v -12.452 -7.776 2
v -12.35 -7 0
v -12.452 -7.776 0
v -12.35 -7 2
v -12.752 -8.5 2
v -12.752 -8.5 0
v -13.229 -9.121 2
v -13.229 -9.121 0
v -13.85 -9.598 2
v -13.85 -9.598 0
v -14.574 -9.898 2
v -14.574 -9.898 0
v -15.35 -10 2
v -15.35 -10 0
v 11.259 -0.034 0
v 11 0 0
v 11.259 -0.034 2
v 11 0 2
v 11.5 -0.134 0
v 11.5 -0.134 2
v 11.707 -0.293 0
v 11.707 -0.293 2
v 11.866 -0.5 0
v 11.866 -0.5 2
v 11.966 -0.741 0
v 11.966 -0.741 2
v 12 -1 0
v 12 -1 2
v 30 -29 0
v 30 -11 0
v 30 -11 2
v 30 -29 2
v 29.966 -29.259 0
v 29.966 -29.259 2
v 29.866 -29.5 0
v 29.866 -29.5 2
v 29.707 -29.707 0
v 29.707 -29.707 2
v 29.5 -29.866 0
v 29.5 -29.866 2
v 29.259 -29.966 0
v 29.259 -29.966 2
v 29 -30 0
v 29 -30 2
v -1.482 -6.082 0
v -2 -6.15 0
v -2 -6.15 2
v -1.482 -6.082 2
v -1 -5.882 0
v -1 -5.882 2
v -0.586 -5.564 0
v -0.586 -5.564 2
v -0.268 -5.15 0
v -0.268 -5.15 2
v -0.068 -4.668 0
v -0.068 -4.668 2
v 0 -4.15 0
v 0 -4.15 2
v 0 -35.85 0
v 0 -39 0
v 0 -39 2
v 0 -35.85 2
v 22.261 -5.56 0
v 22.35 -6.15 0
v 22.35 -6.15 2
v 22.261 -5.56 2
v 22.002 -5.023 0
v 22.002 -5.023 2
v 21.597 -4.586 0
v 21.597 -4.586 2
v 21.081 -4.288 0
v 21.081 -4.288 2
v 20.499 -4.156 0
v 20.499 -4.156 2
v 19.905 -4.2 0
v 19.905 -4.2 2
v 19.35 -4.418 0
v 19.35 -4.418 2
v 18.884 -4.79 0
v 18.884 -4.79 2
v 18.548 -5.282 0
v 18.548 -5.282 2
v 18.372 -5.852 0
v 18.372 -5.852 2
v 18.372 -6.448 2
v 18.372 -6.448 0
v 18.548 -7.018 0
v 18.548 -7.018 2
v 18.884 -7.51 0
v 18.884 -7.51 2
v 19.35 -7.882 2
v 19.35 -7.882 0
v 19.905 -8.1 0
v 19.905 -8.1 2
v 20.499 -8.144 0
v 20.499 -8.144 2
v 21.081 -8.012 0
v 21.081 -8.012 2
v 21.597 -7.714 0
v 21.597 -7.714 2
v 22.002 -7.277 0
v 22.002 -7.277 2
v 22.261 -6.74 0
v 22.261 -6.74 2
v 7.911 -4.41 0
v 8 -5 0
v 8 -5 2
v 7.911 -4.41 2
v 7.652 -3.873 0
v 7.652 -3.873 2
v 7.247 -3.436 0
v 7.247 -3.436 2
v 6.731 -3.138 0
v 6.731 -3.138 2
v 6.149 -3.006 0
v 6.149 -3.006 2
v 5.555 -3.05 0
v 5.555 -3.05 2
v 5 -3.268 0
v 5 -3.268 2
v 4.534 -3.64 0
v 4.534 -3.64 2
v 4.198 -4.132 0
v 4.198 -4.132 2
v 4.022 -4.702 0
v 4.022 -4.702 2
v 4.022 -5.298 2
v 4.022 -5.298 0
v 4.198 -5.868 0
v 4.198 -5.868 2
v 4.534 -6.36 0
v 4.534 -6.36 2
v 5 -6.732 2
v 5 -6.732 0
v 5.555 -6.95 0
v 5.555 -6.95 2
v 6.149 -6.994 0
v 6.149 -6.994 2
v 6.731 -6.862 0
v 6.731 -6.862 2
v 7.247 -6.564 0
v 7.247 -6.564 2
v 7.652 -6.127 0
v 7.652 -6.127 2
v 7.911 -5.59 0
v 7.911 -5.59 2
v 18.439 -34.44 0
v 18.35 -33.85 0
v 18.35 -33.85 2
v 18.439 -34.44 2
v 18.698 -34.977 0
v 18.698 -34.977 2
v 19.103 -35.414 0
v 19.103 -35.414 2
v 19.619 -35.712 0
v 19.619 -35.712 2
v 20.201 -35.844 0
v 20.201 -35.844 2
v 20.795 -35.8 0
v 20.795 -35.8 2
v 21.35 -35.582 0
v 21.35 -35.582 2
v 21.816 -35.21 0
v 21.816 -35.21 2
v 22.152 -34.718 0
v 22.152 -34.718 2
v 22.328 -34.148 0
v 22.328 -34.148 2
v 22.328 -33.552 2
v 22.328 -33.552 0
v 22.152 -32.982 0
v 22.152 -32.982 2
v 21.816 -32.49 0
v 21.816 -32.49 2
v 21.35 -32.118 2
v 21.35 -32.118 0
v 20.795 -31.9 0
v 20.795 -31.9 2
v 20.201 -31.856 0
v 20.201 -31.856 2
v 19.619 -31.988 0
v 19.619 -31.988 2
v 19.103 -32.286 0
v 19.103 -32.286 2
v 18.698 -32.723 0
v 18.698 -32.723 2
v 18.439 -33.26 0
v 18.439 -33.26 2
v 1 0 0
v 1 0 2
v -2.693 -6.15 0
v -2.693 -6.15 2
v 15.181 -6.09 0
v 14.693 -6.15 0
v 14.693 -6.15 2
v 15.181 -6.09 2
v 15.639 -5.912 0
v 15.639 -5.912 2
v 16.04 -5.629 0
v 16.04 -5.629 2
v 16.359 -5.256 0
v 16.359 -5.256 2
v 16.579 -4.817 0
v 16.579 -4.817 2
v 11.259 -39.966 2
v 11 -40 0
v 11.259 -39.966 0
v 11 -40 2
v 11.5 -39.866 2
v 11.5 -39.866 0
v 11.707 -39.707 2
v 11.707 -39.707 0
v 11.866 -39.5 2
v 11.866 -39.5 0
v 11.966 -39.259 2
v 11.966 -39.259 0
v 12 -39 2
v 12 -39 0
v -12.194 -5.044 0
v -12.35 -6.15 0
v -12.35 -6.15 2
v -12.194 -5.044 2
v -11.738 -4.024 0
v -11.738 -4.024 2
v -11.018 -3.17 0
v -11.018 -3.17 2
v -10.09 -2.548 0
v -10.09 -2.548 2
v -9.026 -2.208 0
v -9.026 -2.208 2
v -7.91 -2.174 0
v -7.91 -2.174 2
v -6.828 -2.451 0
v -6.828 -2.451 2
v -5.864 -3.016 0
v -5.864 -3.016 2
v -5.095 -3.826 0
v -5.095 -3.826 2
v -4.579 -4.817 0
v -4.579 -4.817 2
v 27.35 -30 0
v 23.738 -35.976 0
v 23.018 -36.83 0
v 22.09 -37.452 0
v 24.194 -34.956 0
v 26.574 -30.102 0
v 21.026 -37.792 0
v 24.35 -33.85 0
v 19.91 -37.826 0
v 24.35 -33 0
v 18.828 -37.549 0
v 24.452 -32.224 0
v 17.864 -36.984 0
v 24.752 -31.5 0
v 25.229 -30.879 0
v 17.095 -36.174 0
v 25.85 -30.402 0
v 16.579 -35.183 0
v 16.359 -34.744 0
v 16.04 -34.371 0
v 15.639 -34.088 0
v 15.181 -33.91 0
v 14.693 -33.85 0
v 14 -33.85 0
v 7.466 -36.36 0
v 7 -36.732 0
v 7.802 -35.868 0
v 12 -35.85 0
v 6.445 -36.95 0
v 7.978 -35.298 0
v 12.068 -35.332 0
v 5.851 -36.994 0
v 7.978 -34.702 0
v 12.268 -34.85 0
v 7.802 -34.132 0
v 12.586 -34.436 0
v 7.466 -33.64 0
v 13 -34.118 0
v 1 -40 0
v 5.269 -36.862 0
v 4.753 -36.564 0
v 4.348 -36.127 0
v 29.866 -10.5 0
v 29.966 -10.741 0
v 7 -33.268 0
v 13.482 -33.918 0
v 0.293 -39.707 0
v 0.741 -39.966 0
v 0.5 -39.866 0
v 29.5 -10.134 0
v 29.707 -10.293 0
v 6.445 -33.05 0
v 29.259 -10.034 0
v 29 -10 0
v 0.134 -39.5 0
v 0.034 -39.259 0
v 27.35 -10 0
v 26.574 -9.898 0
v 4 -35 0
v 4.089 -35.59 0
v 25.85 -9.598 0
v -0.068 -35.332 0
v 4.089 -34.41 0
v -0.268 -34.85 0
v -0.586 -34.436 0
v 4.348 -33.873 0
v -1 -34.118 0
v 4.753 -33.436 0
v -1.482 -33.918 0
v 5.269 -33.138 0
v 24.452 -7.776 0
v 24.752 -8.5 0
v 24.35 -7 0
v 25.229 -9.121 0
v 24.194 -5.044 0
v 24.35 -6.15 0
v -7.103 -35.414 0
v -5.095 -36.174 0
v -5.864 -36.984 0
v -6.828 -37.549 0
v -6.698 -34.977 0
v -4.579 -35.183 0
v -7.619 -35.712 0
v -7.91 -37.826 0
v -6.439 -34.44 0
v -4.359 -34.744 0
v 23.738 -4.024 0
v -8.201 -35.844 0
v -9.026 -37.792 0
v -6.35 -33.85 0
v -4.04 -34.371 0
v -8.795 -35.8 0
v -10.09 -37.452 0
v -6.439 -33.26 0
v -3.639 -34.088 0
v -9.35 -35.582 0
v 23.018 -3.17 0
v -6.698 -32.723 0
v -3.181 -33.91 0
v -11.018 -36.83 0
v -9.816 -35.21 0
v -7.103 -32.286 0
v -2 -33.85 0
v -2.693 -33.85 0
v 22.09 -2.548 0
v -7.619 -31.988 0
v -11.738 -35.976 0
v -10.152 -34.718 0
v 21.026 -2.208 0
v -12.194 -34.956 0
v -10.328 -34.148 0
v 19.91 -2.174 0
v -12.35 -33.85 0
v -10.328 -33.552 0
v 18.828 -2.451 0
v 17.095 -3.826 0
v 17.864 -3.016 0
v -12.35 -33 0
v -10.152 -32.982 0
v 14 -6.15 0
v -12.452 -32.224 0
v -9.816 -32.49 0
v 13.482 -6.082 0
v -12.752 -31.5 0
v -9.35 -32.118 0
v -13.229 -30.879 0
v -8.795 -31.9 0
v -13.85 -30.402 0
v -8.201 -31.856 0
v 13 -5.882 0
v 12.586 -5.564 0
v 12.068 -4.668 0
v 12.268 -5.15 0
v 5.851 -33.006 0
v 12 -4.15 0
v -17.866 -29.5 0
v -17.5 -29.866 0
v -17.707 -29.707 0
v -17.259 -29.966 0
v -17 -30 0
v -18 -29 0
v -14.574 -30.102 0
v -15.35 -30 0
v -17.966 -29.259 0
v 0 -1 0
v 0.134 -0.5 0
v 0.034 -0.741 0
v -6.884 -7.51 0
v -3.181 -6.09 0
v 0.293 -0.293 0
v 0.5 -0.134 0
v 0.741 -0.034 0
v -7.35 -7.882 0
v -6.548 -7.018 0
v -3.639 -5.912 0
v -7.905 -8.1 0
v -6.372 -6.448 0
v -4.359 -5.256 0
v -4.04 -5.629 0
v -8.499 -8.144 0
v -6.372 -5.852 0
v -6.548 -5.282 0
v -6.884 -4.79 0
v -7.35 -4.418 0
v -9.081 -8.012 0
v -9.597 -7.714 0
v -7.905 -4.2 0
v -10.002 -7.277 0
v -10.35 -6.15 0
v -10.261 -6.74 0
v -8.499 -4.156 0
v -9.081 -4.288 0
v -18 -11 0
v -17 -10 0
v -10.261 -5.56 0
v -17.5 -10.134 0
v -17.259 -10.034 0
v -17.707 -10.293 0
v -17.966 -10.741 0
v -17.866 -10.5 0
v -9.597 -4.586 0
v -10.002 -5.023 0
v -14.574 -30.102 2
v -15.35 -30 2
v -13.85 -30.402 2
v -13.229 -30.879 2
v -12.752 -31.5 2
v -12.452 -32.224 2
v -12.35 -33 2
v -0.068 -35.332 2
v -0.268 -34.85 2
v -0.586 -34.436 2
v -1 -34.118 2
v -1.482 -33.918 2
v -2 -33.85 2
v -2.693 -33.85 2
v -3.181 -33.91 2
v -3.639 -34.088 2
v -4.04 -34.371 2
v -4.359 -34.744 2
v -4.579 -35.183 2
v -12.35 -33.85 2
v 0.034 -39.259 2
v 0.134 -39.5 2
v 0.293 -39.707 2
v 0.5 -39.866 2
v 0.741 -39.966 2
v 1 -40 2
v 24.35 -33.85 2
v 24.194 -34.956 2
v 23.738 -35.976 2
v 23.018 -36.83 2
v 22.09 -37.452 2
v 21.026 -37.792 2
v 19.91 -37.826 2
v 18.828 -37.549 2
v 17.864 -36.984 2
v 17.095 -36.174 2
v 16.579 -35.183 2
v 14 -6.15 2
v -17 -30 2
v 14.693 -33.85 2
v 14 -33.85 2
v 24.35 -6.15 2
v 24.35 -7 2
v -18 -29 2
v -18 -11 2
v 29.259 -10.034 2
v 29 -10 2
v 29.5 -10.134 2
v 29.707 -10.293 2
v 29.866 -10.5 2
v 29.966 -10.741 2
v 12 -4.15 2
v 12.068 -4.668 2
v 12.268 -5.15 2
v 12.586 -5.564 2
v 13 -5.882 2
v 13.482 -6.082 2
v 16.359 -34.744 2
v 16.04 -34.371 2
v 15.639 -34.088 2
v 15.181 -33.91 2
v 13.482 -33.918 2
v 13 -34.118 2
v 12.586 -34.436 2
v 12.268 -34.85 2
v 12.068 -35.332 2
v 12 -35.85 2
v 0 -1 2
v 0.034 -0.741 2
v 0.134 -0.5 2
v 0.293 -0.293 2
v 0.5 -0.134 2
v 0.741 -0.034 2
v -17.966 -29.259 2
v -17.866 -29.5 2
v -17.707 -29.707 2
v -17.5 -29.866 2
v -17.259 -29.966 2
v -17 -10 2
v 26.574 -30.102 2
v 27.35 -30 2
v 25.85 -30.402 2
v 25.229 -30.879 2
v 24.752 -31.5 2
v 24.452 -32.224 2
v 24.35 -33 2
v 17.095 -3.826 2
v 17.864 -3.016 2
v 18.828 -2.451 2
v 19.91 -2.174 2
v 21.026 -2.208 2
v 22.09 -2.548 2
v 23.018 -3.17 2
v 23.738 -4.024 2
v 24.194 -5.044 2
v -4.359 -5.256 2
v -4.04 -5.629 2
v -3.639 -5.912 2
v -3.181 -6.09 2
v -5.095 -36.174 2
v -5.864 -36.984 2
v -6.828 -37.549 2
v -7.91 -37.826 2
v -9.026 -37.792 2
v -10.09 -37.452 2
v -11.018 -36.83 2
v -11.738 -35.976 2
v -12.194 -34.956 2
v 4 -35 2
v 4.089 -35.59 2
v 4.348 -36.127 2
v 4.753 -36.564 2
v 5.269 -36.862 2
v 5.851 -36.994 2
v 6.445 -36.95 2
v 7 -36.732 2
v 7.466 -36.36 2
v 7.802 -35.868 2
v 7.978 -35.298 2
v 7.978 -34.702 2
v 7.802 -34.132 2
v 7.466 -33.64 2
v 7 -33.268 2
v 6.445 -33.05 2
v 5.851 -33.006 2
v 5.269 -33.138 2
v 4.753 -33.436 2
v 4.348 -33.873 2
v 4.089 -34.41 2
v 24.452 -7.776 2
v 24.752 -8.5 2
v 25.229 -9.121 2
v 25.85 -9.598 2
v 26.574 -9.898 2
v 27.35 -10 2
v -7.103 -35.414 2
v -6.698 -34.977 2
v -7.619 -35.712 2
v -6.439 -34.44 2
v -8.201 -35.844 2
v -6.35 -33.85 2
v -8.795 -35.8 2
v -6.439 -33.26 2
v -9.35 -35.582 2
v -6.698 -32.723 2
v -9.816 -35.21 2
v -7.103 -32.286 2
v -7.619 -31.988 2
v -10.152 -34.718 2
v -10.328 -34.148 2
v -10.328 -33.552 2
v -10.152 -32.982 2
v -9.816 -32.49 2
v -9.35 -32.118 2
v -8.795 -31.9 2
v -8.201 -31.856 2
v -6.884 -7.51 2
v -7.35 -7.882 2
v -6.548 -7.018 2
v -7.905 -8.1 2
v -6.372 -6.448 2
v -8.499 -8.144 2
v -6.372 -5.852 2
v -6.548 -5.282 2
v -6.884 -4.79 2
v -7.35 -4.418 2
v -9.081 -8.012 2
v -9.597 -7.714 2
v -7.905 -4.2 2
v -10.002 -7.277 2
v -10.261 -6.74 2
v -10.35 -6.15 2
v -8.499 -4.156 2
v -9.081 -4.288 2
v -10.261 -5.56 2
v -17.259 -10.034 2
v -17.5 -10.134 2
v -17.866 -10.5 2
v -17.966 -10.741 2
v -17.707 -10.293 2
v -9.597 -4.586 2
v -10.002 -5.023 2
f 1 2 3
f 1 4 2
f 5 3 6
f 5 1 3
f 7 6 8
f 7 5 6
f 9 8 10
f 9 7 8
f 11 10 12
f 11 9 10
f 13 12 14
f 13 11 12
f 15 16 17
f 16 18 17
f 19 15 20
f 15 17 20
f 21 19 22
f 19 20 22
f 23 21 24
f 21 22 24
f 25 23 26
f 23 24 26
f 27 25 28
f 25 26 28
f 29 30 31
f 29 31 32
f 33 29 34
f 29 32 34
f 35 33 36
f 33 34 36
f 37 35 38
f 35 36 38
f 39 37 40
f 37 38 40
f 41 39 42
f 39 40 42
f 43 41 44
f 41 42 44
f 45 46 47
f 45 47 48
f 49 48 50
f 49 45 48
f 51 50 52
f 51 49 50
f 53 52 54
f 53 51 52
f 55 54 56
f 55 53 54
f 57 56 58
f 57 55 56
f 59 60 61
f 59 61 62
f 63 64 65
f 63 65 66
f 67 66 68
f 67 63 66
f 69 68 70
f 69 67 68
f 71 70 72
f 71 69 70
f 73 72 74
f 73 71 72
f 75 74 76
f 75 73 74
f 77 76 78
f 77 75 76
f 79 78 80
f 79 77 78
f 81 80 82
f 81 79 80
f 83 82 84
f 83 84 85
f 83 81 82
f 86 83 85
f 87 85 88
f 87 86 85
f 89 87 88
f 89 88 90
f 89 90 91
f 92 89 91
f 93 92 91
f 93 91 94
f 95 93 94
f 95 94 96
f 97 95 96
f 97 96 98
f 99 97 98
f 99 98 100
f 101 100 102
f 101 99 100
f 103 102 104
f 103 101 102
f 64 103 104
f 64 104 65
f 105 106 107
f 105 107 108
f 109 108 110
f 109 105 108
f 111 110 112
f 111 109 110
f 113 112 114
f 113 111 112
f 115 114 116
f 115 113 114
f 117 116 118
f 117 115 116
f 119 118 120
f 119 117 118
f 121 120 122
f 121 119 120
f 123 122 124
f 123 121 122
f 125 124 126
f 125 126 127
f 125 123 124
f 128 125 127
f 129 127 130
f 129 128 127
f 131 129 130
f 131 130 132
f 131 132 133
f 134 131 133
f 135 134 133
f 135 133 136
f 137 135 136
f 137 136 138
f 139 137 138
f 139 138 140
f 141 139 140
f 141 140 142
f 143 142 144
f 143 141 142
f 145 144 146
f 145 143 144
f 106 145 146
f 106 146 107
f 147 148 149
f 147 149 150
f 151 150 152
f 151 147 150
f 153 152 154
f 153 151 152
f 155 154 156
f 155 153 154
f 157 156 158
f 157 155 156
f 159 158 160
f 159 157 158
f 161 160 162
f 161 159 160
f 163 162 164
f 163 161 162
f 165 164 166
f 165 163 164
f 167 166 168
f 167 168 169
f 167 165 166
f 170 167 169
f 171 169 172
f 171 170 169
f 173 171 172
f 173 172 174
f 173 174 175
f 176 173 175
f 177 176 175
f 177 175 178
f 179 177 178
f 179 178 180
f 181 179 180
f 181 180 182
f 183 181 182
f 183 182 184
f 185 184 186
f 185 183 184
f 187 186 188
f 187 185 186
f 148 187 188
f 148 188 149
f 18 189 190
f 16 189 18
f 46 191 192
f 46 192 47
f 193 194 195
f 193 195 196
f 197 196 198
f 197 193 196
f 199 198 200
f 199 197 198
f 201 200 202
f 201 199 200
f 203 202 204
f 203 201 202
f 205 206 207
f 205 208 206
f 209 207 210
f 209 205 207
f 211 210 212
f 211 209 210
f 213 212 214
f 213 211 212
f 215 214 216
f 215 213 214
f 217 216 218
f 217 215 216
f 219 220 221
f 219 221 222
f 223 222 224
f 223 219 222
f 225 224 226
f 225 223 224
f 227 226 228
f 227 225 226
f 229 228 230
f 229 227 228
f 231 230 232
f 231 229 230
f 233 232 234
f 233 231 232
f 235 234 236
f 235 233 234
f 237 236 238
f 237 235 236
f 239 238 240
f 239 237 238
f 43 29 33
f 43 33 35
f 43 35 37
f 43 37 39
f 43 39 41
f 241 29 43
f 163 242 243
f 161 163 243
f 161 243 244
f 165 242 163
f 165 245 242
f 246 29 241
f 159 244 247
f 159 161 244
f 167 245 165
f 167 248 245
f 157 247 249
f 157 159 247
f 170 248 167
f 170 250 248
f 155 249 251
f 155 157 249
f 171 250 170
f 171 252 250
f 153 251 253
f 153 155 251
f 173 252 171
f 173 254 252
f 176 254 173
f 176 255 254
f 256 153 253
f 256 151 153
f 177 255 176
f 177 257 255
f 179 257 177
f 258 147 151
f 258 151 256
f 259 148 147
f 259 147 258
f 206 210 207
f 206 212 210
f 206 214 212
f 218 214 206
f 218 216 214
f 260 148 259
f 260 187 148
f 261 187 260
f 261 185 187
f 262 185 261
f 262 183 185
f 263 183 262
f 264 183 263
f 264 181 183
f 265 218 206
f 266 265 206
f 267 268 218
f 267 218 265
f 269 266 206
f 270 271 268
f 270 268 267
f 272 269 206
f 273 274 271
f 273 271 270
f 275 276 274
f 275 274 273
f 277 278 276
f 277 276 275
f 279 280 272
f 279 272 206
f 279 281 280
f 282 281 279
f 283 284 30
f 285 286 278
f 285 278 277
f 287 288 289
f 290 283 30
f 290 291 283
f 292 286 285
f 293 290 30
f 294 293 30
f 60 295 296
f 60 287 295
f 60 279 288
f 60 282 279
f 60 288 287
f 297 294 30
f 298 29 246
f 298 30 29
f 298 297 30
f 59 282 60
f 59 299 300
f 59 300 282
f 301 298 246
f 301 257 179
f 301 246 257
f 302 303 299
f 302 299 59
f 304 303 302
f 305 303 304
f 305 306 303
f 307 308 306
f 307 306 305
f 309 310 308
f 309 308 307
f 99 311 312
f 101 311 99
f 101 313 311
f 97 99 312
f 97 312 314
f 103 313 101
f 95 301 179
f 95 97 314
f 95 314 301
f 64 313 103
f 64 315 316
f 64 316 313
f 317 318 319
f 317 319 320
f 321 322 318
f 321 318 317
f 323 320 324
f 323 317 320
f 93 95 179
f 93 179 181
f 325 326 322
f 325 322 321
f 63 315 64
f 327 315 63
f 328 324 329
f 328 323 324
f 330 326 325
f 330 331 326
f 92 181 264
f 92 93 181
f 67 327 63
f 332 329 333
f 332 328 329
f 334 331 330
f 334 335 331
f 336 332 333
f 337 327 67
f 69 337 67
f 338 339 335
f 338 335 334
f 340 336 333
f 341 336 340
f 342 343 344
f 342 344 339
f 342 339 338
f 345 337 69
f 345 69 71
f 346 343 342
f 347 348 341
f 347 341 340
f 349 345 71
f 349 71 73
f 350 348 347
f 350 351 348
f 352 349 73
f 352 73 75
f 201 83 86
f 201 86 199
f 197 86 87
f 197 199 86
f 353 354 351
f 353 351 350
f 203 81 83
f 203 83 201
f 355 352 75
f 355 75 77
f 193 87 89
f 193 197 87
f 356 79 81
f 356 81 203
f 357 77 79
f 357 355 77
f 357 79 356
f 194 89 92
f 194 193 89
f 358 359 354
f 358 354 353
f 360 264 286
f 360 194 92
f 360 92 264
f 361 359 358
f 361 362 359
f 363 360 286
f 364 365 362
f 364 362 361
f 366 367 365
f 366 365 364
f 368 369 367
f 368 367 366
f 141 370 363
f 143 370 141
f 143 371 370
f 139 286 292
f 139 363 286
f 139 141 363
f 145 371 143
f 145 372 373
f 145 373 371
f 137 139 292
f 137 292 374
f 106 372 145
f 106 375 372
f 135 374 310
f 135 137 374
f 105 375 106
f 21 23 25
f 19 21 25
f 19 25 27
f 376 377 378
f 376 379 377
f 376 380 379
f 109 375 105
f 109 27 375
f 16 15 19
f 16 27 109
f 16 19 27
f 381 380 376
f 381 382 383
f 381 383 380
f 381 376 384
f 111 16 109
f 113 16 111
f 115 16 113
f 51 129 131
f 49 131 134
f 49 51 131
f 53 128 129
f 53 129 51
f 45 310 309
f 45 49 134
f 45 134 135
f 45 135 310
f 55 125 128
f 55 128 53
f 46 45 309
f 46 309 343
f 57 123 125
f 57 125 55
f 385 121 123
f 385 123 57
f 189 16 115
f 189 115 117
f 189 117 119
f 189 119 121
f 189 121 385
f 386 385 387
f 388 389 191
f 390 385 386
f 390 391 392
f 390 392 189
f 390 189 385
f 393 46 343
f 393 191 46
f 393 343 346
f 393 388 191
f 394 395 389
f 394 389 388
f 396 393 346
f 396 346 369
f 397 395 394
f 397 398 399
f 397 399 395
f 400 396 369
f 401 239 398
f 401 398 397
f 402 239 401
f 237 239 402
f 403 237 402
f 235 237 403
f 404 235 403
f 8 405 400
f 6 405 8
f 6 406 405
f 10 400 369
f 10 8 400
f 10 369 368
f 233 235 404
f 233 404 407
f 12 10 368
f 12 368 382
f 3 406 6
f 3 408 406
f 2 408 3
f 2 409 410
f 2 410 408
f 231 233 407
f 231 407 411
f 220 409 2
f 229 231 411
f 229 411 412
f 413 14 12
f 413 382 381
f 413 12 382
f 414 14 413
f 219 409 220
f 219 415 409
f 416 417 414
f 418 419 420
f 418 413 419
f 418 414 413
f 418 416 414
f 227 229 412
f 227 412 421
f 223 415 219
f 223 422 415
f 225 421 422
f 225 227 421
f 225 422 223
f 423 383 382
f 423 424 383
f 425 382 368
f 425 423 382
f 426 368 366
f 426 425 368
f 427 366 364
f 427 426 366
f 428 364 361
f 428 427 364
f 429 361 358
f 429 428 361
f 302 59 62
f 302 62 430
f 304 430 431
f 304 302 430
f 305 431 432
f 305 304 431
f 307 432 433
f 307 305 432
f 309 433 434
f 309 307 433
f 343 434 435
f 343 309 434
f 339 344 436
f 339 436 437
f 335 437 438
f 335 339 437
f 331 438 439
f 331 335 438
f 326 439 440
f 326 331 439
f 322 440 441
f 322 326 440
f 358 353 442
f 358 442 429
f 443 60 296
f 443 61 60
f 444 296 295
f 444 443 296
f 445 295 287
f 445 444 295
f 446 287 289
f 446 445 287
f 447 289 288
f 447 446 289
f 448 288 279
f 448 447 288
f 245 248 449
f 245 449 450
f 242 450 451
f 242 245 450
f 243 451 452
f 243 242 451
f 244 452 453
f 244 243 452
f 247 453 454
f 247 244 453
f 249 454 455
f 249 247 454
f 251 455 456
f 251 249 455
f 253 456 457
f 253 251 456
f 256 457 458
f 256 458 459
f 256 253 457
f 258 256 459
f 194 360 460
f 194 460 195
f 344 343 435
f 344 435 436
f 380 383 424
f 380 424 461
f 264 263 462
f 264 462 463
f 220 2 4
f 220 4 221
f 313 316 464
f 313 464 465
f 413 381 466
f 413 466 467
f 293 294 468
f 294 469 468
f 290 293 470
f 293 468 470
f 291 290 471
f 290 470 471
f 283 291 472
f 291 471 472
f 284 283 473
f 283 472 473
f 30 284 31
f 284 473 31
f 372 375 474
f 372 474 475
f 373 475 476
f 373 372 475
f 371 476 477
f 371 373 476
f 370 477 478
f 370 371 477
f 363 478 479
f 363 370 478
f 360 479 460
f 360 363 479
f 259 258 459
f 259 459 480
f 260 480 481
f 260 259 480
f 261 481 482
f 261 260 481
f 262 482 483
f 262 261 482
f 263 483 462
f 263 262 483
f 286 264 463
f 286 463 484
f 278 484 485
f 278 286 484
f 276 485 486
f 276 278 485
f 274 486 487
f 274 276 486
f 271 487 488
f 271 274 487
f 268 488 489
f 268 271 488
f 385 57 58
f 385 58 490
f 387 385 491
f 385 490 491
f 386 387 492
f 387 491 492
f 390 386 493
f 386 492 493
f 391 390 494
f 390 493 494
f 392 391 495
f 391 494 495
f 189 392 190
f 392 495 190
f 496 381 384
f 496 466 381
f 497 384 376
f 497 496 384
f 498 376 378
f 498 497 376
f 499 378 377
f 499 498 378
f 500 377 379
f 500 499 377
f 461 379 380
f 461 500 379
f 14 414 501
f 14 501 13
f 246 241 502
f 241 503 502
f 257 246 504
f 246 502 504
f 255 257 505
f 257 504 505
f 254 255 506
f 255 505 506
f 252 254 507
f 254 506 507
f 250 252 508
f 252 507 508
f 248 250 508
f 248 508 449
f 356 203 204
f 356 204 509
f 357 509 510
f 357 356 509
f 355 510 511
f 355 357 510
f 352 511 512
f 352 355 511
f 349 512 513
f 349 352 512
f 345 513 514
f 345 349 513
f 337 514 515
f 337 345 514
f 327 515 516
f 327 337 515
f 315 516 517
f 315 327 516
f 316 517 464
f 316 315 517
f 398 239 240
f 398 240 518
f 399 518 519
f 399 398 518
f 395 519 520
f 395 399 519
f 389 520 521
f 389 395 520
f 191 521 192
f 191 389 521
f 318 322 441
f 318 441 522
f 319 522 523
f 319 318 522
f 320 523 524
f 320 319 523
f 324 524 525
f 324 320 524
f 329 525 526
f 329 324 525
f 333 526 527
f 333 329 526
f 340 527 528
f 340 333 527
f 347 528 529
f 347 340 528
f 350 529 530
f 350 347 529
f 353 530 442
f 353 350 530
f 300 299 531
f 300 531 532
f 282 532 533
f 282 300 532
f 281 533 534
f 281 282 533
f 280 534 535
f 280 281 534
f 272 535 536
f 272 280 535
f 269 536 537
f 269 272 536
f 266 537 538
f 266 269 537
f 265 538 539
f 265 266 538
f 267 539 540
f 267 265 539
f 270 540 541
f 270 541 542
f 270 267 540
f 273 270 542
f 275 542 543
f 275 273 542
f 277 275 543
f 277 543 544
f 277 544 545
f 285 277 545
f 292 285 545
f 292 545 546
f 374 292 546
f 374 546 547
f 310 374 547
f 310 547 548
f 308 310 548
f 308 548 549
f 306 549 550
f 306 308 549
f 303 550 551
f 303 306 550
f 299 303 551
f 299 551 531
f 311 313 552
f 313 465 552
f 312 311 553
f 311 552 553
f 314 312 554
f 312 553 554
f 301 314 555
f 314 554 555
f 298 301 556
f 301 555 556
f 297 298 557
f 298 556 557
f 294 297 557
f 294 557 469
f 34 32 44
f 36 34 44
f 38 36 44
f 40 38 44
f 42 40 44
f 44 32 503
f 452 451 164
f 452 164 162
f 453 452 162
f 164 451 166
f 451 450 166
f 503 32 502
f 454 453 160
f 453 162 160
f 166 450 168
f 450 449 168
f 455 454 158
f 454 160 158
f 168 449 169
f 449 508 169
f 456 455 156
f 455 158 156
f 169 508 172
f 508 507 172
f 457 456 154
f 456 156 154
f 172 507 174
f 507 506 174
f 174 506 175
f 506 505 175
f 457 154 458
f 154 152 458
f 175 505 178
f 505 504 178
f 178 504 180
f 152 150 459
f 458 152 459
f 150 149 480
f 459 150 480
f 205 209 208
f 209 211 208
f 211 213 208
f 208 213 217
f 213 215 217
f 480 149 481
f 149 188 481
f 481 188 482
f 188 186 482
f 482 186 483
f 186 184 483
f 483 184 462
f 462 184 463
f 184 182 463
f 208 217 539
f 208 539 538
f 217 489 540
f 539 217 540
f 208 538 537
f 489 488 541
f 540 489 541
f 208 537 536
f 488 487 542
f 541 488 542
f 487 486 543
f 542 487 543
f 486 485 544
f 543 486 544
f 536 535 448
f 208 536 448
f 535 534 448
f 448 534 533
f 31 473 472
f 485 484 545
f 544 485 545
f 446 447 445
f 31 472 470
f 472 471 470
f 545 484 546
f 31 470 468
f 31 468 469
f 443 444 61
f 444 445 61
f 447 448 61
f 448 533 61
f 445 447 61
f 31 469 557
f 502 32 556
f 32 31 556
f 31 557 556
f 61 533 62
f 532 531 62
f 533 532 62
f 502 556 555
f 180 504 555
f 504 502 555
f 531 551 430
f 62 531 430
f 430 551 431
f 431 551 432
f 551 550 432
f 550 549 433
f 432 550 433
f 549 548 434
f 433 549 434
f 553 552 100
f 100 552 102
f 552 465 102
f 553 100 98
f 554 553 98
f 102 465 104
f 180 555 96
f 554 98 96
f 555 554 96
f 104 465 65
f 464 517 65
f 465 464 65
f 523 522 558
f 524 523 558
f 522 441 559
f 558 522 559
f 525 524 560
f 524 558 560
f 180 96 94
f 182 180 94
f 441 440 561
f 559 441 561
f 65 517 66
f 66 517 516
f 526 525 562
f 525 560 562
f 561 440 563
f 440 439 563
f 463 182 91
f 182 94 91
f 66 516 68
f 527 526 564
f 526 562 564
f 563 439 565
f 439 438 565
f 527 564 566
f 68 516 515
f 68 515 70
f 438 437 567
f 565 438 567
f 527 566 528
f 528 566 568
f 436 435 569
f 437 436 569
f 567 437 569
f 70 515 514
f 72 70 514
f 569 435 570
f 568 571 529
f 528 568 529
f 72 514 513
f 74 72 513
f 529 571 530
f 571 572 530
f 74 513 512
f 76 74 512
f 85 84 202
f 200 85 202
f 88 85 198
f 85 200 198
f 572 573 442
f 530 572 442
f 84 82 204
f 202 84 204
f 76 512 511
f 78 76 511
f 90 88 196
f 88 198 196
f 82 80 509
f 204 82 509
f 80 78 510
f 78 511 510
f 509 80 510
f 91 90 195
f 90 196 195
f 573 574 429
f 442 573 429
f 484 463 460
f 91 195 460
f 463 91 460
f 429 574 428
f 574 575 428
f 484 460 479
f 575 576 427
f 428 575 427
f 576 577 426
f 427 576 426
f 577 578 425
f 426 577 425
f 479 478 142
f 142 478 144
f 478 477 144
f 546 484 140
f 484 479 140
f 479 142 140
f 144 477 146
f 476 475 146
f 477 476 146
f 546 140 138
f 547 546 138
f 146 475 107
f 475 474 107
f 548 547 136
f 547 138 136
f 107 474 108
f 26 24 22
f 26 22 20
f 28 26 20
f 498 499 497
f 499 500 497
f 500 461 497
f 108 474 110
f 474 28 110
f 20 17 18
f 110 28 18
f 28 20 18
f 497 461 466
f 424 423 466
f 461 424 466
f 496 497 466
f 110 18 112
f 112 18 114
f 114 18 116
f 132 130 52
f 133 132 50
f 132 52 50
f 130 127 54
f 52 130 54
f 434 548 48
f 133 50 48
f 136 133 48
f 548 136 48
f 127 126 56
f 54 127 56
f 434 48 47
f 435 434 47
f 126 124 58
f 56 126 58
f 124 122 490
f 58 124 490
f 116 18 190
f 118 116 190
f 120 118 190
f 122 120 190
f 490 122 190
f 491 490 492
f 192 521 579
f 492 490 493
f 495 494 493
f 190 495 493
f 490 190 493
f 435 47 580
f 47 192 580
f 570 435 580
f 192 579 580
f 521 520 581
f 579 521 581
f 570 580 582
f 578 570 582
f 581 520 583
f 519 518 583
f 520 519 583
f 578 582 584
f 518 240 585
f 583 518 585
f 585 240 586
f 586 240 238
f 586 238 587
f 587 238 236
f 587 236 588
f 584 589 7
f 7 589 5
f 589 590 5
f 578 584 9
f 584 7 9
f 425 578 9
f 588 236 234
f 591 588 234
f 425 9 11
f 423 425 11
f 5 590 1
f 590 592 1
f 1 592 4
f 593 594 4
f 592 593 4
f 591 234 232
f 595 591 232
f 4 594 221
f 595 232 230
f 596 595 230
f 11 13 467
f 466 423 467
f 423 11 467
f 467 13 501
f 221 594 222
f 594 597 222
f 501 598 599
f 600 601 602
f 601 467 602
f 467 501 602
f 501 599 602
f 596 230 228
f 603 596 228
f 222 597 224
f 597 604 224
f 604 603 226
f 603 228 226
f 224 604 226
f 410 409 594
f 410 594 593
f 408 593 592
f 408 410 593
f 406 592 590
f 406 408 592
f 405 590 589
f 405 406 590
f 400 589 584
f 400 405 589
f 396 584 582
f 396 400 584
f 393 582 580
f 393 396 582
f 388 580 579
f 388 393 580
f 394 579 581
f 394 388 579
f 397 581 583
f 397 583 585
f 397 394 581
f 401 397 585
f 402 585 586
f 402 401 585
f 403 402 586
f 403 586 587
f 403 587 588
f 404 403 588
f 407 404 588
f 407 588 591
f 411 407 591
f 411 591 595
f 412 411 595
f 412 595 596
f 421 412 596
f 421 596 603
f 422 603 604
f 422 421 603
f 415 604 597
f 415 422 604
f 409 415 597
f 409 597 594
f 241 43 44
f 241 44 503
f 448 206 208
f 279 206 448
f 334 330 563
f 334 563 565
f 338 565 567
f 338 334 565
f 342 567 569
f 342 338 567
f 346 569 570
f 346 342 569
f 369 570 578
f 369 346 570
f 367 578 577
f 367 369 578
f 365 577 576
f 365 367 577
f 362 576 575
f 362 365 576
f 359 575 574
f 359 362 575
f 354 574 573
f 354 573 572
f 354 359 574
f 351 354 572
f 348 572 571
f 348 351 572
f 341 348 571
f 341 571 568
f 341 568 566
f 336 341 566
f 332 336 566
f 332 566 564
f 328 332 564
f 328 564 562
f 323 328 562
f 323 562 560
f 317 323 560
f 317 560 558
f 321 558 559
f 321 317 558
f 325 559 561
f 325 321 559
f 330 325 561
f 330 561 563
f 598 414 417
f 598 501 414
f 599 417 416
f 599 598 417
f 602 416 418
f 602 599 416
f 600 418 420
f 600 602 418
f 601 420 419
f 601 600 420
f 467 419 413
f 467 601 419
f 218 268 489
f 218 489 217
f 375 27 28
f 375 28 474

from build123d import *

# Parameters (mm, degrees)
SKETCH_1_R      = 2
EXTRUDE_1_DEPTH = 2
FILLET_1_R      = 3
FILLET_2_R      = 1


with BuildPart() as part:
    # ｽｹｯﾁ1 → ﾎﾞｽ - 押し出し1 (new body)
    with BuildSketch(Plane.XY):
        with BuildLine():
            Line((0, 0), (12, 0))
            Line((12, 0), (12, -4.15))
            ThreePointArc((12, -4.15), (12.585786438, -5.564213562), (14, -6.15))
            Line((14, -6.15), (14.693145751, -6.15))
            ThreePointArc((14.693145751, -6.15), (15.847846289, -5.782993162), (16.578763834, -4.816666667))
            ThreePointArc((16.578763834, -4.816666667), (21.026407915, -2.207605761), (24.35, -6.15))
            Line((24.35, -6.15), (24.35, -10))
            Line((24.35, -10), (30, -10))
            Line((30, -10), (30, -30))
            Line((30, -30), (24.35, -30))
            Line((24.35, -30), (24.35, -33.85))
            ThreePointArc((24.35, -33.85), (21.026407915, -37.792394239), (16.578763834, -35.183333333))
            ThreePointArc((16.578763834, -35.183333333), (15.847846289, -34.217006838), (14.693145751, -33.85))
            Line((14.693145751, -33.85), (14, -33.85))
            ThreePointArc((14, -33.85), (12.585786438, -34.435786438), (12, -35.85))
            Line((12, -35.85), (12, -40))
            Line((12, -40), (0, -40))
            Line((0, -40), (0, -35.85))
            ThreePointArc((0, -35.85), (-0.585786438, -34.435786438), (-2, -33.85))
            Line((-2, -33.85), (-2.693145751, -33.85))
            ThreePointArc((-2.693145751, -33.85), (-3.847846289, -34.217006838), (-4.578763834, -35.183333333))
            ThreePointArc((-4.578763834, -35.183333333), (-9.026407915, -37.792394239), (-12.35, -33.85))
            Line((-12.35, -33.85), (-12.35, -30))
            Line((-12.35, -30), (-18, -30))
            Line((-18, -30), (-18, -10))
            Line((-18, -10), (-12.35, -10))
            Line((-12.35, -10), (-12.35, -6.15))
            ThreePointArc((-12.35, -6.15), (-9.026407915, -2.207605761), (-4.578763834, -4.816666667))
            ThreePointArc((-4.578763834, -4.816666667), (-3.847846289, -5.782993162), (-2.693145751, -6.15))
            Line((-2.693145751, -6.15), (-2, -6.15))
            ThreePointArc((-2, -6.15), (-0.585786438, -5.564213562), (0, -4.15))
            Line((0, -4.15), (0, 0))
        make_face()
        with Locations((20.35, -6.15)):
            Circle(SKETCH_1_R, mode=Mode.SUBTRACT)
        with Locations(Location((-8.35, -6.15, 0), (0, 0, 180))):
            Circle(SKETCH_1_R, mode=Mode.SUBTRACT)
        with Locations(Location((20.35, -33.85, 0), (0, 0, 180))):
            Circle(SKETCH_1_R, mode=Mode.SUBTRACT)
        with Locations((-8.35, -33.85)):
            Circle(SKETCH_1_R, mode=Mode.SUBTRACT)
        with Locations((6, -5)):
            Circle(SKETCH_1_R, mode=Mode.SUBTRACT)
        with Locations(Location((6, -35, 0), (0, 0, 180))):
            Circle(SKETCH_1_R, mode=Mode.SUBTRACT)
    extrude(amount=EXTRUDE_1_DEPTH)

    # ﾌｨﾚｯﾄ1
    fillet_1_edges = [part.edges().sort_by_distance(p)[0] for p in [
        (24.35, -10, 1),
        (24.35, -30, 1),
        (-12.35, -30, 1),
        (-12.35, -10, 1),
    ]]
    fillet(fillet_1_edges, radius=FILLET_1_R)

    # ﾌｨﾚｯﾄ2
    fillet_2_edges = [part.edges().sort_by_distance(p)[0] for p in [
        (0, 0, 1),
        (12, 0, 1),
        (30, -10, 1),
        (30, -30, 1),
        (12, -40, 1),
        (0, -40, 1),
        (-18, -30, 1),
        (-18, -10, 1),
    ]]
    fillet(fillet_2_edges, radius=FILLET_2_R)


solid = part.part
